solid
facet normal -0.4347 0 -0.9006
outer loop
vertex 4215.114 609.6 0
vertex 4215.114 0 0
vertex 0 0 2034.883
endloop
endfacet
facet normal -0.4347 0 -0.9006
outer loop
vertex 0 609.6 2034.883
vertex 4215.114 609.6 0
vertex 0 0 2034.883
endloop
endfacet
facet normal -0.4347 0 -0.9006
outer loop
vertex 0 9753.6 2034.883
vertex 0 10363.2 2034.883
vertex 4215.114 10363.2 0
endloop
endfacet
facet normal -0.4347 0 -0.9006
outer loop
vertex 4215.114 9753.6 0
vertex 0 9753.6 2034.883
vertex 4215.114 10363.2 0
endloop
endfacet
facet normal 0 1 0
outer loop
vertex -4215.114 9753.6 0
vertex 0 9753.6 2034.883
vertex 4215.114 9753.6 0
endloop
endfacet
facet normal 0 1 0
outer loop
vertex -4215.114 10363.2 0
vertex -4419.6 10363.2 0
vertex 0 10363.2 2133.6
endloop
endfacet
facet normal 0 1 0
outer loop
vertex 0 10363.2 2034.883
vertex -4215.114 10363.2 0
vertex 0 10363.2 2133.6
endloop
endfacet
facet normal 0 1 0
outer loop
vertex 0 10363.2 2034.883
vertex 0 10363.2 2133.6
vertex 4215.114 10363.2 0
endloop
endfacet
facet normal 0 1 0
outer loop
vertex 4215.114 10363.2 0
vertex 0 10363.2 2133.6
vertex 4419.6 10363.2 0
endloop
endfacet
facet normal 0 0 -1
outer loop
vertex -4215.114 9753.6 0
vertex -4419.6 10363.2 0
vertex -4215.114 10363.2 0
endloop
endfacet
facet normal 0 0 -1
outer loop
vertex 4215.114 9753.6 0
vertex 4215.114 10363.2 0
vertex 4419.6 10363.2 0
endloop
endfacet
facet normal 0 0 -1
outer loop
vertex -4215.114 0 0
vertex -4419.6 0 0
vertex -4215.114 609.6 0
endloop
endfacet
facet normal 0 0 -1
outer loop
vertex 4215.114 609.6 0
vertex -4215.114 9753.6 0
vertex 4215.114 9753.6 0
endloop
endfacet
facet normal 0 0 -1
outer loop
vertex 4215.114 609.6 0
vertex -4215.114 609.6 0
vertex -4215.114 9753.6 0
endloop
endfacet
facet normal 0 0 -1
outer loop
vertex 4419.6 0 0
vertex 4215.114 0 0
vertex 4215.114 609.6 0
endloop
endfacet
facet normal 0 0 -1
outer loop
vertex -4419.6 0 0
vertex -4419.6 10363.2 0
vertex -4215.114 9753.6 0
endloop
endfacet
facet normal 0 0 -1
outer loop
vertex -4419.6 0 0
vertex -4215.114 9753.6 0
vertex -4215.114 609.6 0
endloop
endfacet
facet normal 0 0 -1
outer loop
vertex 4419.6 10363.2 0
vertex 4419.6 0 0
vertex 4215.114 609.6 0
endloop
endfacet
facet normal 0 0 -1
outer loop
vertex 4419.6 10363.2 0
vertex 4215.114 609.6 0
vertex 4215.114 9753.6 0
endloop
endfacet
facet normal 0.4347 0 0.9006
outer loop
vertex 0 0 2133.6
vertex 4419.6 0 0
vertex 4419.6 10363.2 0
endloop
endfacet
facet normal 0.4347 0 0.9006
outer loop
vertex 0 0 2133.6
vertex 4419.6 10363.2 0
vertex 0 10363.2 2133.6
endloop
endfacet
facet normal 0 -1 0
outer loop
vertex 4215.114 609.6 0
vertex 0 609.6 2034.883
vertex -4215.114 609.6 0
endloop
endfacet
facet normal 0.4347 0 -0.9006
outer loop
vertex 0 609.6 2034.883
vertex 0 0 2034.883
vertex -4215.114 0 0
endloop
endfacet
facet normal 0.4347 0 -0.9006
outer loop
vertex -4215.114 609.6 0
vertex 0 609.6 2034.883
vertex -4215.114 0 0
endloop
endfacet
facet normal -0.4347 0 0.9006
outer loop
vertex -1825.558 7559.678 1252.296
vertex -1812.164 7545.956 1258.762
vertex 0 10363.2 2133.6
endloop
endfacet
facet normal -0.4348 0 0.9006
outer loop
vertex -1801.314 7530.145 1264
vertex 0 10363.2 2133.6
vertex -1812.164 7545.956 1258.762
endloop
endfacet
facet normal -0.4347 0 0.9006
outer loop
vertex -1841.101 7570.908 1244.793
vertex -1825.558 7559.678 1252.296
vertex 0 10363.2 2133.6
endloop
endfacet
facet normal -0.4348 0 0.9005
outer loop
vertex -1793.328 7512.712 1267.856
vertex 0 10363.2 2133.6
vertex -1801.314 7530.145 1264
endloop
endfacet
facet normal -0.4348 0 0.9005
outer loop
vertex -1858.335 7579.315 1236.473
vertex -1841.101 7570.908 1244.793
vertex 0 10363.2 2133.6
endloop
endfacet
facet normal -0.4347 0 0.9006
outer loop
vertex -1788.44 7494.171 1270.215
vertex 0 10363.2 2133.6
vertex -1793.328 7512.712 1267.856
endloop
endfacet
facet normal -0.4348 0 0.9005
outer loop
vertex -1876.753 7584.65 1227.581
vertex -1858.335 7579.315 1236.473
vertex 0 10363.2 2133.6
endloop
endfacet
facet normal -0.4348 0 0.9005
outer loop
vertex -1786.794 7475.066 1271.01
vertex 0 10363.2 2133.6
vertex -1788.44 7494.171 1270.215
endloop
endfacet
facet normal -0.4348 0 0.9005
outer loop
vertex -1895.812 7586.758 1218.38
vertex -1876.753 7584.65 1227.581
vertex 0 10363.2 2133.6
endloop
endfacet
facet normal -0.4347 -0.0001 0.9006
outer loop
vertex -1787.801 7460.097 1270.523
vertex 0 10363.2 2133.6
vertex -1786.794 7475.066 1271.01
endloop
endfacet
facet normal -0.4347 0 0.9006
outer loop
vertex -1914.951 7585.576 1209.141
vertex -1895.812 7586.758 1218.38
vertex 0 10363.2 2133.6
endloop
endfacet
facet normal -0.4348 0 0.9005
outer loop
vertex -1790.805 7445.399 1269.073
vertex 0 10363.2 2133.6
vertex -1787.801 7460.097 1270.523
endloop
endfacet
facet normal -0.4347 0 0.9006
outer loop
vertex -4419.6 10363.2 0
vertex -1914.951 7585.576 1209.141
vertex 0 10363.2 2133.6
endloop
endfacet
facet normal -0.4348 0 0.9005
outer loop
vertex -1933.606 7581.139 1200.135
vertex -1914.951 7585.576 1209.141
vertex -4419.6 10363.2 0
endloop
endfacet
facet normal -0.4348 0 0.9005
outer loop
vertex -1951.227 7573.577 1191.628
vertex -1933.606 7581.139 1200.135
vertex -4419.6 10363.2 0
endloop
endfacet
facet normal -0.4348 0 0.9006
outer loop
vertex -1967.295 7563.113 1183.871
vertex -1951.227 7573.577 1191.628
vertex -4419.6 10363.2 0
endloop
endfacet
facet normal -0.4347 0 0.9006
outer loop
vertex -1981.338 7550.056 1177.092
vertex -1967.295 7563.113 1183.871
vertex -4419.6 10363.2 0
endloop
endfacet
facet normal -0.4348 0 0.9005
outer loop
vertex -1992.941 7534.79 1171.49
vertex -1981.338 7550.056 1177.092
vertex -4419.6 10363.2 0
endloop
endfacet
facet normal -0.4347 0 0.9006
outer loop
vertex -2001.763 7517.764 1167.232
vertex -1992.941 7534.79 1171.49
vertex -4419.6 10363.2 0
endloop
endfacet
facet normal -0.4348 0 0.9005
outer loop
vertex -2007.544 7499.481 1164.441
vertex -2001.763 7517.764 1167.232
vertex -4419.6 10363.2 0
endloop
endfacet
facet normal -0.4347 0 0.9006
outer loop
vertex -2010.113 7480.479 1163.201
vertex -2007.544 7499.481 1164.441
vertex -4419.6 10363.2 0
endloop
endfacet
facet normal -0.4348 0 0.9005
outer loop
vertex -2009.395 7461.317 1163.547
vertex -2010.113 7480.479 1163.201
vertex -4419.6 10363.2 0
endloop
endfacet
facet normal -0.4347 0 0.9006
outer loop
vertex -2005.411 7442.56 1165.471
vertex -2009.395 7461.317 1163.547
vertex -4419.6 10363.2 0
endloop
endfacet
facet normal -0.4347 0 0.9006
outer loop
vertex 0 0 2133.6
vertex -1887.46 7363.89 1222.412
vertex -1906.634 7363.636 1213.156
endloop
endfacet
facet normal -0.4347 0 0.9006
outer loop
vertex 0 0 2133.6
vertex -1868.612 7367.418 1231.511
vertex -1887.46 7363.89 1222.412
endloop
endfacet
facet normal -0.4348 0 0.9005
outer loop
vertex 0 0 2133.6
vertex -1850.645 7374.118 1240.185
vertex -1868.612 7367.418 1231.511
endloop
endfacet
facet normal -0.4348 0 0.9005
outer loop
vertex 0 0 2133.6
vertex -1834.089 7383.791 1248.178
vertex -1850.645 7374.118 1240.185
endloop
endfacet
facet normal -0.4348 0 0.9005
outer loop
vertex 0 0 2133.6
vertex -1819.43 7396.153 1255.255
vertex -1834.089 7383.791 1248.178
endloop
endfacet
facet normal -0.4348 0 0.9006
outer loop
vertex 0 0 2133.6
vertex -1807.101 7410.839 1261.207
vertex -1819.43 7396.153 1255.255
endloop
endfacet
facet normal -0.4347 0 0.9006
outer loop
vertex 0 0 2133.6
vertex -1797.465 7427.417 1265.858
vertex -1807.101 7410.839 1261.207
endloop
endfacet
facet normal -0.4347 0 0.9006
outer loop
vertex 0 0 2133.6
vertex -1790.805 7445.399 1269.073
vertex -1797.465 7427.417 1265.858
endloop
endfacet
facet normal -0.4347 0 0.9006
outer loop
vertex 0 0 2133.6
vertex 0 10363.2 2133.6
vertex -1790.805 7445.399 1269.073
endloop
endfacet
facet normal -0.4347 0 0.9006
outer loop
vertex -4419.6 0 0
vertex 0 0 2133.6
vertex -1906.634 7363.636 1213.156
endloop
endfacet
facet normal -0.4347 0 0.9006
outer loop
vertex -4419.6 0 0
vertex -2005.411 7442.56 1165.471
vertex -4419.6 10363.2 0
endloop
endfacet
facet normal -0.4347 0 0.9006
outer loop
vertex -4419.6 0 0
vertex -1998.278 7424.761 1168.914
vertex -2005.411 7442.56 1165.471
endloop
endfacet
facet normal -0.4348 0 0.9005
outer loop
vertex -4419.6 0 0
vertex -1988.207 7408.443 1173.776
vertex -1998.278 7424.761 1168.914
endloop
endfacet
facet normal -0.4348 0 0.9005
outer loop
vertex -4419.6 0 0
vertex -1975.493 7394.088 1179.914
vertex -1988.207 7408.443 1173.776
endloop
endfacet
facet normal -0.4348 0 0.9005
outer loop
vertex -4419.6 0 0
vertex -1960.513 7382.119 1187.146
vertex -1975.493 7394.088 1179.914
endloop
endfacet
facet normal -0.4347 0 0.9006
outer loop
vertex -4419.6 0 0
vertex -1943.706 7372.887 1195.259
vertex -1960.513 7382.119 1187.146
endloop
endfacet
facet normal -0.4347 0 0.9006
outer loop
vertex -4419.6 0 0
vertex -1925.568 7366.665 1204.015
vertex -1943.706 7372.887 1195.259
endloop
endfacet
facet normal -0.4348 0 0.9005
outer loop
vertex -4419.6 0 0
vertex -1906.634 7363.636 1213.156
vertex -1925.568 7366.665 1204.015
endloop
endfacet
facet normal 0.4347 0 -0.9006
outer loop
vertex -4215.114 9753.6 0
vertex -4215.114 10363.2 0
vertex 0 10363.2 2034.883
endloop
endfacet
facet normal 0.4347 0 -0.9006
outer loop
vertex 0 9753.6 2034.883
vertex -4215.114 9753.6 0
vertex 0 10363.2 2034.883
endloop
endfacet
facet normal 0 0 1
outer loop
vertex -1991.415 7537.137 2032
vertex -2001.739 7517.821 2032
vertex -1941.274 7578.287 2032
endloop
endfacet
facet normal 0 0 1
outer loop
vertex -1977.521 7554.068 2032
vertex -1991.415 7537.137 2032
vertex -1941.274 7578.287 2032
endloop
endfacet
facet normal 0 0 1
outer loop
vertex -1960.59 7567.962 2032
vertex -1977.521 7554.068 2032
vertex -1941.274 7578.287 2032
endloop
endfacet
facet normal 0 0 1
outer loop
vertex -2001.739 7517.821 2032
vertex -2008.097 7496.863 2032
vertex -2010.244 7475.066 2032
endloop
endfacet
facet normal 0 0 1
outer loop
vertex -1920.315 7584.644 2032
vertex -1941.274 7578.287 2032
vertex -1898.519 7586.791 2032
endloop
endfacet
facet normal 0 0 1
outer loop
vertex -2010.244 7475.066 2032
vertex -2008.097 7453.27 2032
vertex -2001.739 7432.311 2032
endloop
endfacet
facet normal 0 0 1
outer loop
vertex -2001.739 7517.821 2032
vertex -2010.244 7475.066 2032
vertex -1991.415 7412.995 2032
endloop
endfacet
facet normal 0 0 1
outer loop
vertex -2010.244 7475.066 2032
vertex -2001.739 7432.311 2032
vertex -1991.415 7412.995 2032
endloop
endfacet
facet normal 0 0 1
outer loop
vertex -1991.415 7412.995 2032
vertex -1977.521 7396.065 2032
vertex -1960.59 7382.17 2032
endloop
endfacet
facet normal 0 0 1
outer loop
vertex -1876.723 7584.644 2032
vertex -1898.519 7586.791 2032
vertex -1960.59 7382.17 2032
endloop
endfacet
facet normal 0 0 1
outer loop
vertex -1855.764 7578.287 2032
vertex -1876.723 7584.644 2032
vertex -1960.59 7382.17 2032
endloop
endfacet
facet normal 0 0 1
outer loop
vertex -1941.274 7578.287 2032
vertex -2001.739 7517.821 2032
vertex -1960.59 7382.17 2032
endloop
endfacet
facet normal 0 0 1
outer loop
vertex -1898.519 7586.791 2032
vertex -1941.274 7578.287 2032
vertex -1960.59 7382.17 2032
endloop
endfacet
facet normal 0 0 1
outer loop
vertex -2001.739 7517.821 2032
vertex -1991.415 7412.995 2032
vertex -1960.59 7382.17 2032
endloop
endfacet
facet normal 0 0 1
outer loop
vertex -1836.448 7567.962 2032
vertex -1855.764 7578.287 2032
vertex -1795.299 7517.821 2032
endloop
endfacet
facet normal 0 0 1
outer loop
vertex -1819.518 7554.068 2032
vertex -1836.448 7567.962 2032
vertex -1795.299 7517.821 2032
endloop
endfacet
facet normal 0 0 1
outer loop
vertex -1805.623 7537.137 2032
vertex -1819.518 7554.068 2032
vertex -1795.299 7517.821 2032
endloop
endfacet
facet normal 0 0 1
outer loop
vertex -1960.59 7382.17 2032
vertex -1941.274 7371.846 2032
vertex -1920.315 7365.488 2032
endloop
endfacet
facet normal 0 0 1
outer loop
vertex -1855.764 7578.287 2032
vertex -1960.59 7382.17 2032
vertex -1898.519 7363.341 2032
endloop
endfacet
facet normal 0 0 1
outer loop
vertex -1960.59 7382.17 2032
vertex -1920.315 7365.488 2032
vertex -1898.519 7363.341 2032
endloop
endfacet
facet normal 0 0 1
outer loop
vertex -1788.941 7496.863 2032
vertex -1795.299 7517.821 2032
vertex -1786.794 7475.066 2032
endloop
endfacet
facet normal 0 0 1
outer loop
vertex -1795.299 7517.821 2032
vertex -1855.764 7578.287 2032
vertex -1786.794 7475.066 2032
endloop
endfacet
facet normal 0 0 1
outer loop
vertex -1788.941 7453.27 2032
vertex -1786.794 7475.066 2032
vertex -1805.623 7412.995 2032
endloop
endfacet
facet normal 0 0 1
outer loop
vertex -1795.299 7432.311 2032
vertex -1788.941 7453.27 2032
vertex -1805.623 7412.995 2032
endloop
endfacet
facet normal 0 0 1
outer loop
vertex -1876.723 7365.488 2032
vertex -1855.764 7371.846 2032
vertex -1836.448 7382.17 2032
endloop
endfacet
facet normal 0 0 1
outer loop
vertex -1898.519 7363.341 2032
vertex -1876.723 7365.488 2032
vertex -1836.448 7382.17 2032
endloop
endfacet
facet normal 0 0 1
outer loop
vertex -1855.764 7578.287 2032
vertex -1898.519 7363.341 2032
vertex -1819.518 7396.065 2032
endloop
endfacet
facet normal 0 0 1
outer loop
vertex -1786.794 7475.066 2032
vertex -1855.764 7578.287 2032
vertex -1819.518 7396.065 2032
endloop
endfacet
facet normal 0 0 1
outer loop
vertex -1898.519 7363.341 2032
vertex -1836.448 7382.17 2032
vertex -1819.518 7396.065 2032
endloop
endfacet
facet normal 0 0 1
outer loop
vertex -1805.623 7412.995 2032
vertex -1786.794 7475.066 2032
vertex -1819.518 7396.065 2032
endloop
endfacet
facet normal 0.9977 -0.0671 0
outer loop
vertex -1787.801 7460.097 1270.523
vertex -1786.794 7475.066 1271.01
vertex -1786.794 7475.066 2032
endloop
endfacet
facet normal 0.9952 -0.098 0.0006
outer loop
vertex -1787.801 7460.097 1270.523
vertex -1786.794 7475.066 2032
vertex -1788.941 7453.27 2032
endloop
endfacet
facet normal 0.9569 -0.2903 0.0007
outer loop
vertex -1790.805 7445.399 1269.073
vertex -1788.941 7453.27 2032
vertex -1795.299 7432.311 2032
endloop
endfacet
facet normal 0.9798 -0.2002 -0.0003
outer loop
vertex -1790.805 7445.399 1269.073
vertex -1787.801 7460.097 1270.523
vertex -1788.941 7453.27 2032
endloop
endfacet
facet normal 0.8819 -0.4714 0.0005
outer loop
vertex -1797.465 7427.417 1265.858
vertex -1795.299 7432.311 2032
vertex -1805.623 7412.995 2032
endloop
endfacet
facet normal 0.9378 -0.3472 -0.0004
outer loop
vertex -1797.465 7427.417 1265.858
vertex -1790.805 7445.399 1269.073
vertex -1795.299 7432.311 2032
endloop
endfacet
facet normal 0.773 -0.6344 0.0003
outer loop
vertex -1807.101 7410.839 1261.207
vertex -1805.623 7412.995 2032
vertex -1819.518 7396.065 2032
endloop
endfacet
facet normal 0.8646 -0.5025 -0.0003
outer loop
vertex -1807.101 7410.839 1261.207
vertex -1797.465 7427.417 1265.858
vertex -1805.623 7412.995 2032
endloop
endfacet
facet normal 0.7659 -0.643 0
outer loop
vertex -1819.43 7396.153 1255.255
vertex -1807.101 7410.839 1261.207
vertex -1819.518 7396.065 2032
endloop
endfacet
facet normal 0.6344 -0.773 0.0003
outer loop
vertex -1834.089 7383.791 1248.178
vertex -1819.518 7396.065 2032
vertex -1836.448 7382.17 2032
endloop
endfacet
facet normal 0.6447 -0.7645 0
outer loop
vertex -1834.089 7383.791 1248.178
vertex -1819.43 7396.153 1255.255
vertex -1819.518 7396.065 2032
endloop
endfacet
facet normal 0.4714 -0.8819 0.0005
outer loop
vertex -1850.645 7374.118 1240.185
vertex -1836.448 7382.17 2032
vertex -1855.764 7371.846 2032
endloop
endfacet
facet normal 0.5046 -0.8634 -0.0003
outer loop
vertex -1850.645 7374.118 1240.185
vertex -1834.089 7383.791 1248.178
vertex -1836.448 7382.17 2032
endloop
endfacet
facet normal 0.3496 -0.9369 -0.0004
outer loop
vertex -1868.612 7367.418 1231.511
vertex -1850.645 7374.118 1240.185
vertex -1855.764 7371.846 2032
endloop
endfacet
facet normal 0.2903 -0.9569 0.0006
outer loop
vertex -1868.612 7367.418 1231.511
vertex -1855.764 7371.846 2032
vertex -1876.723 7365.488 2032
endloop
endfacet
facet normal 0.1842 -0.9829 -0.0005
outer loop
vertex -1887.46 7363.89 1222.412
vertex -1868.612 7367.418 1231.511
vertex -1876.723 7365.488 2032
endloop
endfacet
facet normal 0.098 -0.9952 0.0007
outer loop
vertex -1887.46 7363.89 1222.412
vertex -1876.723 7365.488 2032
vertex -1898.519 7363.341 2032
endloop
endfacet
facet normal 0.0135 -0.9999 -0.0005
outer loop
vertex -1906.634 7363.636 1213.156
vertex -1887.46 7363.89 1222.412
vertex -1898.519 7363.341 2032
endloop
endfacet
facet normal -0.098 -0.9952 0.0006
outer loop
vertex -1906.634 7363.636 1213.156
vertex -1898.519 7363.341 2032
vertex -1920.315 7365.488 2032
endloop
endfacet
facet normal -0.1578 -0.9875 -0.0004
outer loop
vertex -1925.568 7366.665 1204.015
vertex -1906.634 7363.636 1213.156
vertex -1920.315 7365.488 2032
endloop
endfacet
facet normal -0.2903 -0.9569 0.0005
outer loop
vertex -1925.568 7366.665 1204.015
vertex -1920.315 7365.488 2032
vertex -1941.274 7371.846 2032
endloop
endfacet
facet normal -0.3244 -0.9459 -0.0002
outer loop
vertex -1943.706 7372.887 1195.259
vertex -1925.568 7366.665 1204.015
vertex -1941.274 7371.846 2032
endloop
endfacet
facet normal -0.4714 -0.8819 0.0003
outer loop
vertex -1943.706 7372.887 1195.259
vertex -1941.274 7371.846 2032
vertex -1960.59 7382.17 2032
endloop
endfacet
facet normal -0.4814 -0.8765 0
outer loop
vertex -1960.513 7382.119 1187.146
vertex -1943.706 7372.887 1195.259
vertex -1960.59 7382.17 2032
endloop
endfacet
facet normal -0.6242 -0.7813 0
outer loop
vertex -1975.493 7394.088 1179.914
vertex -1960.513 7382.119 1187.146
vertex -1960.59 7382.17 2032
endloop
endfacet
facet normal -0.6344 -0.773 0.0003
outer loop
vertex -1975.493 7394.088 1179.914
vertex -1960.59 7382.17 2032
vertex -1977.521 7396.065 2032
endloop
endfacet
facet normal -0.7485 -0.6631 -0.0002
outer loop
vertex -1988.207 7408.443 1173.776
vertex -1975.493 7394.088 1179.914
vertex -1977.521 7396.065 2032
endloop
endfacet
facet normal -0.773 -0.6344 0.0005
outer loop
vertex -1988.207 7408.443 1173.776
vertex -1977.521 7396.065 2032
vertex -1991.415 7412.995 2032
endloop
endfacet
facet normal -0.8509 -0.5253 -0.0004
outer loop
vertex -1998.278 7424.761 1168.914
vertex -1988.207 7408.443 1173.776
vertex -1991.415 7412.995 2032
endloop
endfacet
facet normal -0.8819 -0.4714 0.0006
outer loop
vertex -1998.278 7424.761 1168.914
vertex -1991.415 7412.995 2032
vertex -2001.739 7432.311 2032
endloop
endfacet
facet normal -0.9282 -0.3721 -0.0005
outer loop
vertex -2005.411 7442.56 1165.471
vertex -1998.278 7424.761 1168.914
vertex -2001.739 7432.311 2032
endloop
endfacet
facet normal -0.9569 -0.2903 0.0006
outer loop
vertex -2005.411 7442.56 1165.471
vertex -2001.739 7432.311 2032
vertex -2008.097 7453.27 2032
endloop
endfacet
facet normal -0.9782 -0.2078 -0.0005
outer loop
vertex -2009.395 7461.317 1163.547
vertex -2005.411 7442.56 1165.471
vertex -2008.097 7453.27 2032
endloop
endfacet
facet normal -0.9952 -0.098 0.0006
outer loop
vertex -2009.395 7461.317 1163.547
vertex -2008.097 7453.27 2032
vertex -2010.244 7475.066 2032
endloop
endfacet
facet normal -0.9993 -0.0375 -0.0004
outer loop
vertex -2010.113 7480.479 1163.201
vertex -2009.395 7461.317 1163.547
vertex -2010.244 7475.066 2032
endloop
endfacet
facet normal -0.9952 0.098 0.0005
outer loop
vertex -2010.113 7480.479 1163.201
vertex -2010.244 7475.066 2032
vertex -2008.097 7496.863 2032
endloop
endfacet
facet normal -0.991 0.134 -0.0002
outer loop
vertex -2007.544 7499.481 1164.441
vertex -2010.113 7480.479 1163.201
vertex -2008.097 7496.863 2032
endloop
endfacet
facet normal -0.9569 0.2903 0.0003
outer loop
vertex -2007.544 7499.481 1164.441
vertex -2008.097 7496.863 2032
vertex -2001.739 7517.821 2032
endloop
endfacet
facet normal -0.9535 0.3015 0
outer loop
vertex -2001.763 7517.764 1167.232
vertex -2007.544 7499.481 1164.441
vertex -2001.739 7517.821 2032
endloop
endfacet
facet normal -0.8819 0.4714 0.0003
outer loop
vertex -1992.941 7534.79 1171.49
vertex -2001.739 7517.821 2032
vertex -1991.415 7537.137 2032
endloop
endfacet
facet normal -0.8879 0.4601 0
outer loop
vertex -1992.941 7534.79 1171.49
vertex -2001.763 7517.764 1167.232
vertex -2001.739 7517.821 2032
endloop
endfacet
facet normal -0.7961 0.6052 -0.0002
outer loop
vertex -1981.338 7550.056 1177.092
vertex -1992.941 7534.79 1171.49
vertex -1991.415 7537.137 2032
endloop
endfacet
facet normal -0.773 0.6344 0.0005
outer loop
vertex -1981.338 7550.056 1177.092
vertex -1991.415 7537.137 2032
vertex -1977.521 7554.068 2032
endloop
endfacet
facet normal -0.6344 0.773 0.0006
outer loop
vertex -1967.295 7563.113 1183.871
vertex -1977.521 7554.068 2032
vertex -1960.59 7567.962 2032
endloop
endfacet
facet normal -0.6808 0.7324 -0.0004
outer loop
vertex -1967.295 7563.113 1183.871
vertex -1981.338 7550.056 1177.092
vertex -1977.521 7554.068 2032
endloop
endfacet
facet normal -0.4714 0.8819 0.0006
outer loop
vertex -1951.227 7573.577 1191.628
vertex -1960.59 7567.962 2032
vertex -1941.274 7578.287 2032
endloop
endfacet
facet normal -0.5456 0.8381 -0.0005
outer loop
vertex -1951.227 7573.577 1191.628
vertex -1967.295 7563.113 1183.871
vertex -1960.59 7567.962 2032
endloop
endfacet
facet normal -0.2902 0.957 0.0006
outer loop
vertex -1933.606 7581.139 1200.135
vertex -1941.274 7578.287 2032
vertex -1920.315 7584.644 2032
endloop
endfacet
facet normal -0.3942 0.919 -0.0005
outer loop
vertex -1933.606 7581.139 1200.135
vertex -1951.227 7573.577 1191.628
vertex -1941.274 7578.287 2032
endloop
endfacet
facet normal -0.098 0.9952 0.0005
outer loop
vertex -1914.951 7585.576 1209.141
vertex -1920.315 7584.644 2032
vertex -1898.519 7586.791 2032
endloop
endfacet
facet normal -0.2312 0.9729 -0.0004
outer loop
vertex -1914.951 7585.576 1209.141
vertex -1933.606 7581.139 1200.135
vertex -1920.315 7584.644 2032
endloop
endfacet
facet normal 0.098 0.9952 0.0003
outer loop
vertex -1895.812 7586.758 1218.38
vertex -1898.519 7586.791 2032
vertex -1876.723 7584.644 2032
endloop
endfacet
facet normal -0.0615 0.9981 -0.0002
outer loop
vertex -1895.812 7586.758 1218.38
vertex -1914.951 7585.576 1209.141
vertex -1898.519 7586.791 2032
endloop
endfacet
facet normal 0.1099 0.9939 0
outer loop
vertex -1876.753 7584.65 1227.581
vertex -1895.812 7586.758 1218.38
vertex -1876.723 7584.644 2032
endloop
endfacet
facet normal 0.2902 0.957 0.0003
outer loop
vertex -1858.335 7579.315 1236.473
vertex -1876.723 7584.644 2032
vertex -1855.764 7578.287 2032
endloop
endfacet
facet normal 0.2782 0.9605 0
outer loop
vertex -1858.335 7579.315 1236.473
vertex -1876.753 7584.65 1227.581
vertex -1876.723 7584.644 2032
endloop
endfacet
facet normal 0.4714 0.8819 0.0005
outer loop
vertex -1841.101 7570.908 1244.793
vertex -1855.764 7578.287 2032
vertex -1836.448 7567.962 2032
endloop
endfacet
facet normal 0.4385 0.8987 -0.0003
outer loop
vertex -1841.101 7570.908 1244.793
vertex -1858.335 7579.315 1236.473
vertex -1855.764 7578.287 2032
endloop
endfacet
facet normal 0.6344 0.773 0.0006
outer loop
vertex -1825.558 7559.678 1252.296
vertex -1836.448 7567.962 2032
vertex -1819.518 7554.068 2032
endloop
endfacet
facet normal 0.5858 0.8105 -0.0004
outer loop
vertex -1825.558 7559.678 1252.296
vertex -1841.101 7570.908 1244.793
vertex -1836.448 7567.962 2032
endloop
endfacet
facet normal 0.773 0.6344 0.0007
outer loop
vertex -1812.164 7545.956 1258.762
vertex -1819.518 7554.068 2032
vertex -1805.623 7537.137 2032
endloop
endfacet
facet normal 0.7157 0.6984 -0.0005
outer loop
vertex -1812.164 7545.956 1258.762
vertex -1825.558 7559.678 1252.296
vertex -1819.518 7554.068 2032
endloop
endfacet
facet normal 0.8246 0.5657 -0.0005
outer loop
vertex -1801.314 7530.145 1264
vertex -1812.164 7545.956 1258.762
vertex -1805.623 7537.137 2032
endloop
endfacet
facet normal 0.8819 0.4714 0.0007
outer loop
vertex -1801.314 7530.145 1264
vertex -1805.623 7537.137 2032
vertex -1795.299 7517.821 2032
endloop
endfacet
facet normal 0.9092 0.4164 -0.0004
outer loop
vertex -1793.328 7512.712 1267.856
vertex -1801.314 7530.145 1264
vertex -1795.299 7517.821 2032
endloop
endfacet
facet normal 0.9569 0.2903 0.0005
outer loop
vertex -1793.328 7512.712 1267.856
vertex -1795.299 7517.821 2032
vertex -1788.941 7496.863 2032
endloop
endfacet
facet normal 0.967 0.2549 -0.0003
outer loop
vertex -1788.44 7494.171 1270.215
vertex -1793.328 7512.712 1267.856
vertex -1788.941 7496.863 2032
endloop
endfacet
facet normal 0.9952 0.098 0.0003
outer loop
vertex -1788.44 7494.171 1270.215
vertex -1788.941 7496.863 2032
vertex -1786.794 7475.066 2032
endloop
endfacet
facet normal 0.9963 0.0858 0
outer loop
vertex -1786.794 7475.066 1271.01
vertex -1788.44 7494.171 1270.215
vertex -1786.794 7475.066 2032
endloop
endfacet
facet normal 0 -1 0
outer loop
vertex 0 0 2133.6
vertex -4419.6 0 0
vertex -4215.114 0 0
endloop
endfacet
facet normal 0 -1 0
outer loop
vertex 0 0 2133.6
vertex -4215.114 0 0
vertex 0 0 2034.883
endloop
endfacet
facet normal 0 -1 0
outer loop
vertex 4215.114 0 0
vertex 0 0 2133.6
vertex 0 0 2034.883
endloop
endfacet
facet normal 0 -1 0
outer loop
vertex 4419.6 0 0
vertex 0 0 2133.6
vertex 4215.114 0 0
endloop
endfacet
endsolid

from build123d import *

# Parameters (mm, degrees)
F1_DEPTH = 10363.2
F3_DEPTH = 609.6
F5_DEPTH = 609.6
F6_R     = 111.724942856
F7_DEPTH = 2032


with BuildPart() as f1:
    # F0 (on Front) → F1 (new body)
    with BuildSketch(Plane.XZ):
        Polygon((-4419.6, 0), (0, 0), (4419.6, 0), (0, 2133.6), align=None)
    extrude(amount=-F1_DEPTH)

    # F2 (on face) → F3 (cut)
    with BuildSketch(Plane.XZ):
        Polygon((0, 2034.8827289295), (-4215.1142242111, 0), (4215.1142242111, 0), align=None)
    extrude(amount=-F3_DEPTH, mode=Mode.SUBTRACT)

    # F4 (on face) → F5 (cut)
    with BuildSketch(Plane(origin=(0, 10363.2, 0), x_dir=(-1, 0, 0), z_dir=(0, 1, 0))):
        Polygon((4215.1142242111, 0), (0, 2034.8827289295), (-4215.1142242111, 0), align=None)
    extrude(amount=-F5_DEPTH, mode=Mode.SUBTRACT)

    # F6 (on face) → F7 (join)
    with BuildSketch(Plane(origin=(0, 0, 0), x_dir=(1, 0, 0), z_dir=(0, 0, -1))):
        with Locations((-1898.5190391541, -7475.0661849976)):
            Circle(F6_R)
    extrude(amount=-F7_DEPTH)


solid = f1.part
